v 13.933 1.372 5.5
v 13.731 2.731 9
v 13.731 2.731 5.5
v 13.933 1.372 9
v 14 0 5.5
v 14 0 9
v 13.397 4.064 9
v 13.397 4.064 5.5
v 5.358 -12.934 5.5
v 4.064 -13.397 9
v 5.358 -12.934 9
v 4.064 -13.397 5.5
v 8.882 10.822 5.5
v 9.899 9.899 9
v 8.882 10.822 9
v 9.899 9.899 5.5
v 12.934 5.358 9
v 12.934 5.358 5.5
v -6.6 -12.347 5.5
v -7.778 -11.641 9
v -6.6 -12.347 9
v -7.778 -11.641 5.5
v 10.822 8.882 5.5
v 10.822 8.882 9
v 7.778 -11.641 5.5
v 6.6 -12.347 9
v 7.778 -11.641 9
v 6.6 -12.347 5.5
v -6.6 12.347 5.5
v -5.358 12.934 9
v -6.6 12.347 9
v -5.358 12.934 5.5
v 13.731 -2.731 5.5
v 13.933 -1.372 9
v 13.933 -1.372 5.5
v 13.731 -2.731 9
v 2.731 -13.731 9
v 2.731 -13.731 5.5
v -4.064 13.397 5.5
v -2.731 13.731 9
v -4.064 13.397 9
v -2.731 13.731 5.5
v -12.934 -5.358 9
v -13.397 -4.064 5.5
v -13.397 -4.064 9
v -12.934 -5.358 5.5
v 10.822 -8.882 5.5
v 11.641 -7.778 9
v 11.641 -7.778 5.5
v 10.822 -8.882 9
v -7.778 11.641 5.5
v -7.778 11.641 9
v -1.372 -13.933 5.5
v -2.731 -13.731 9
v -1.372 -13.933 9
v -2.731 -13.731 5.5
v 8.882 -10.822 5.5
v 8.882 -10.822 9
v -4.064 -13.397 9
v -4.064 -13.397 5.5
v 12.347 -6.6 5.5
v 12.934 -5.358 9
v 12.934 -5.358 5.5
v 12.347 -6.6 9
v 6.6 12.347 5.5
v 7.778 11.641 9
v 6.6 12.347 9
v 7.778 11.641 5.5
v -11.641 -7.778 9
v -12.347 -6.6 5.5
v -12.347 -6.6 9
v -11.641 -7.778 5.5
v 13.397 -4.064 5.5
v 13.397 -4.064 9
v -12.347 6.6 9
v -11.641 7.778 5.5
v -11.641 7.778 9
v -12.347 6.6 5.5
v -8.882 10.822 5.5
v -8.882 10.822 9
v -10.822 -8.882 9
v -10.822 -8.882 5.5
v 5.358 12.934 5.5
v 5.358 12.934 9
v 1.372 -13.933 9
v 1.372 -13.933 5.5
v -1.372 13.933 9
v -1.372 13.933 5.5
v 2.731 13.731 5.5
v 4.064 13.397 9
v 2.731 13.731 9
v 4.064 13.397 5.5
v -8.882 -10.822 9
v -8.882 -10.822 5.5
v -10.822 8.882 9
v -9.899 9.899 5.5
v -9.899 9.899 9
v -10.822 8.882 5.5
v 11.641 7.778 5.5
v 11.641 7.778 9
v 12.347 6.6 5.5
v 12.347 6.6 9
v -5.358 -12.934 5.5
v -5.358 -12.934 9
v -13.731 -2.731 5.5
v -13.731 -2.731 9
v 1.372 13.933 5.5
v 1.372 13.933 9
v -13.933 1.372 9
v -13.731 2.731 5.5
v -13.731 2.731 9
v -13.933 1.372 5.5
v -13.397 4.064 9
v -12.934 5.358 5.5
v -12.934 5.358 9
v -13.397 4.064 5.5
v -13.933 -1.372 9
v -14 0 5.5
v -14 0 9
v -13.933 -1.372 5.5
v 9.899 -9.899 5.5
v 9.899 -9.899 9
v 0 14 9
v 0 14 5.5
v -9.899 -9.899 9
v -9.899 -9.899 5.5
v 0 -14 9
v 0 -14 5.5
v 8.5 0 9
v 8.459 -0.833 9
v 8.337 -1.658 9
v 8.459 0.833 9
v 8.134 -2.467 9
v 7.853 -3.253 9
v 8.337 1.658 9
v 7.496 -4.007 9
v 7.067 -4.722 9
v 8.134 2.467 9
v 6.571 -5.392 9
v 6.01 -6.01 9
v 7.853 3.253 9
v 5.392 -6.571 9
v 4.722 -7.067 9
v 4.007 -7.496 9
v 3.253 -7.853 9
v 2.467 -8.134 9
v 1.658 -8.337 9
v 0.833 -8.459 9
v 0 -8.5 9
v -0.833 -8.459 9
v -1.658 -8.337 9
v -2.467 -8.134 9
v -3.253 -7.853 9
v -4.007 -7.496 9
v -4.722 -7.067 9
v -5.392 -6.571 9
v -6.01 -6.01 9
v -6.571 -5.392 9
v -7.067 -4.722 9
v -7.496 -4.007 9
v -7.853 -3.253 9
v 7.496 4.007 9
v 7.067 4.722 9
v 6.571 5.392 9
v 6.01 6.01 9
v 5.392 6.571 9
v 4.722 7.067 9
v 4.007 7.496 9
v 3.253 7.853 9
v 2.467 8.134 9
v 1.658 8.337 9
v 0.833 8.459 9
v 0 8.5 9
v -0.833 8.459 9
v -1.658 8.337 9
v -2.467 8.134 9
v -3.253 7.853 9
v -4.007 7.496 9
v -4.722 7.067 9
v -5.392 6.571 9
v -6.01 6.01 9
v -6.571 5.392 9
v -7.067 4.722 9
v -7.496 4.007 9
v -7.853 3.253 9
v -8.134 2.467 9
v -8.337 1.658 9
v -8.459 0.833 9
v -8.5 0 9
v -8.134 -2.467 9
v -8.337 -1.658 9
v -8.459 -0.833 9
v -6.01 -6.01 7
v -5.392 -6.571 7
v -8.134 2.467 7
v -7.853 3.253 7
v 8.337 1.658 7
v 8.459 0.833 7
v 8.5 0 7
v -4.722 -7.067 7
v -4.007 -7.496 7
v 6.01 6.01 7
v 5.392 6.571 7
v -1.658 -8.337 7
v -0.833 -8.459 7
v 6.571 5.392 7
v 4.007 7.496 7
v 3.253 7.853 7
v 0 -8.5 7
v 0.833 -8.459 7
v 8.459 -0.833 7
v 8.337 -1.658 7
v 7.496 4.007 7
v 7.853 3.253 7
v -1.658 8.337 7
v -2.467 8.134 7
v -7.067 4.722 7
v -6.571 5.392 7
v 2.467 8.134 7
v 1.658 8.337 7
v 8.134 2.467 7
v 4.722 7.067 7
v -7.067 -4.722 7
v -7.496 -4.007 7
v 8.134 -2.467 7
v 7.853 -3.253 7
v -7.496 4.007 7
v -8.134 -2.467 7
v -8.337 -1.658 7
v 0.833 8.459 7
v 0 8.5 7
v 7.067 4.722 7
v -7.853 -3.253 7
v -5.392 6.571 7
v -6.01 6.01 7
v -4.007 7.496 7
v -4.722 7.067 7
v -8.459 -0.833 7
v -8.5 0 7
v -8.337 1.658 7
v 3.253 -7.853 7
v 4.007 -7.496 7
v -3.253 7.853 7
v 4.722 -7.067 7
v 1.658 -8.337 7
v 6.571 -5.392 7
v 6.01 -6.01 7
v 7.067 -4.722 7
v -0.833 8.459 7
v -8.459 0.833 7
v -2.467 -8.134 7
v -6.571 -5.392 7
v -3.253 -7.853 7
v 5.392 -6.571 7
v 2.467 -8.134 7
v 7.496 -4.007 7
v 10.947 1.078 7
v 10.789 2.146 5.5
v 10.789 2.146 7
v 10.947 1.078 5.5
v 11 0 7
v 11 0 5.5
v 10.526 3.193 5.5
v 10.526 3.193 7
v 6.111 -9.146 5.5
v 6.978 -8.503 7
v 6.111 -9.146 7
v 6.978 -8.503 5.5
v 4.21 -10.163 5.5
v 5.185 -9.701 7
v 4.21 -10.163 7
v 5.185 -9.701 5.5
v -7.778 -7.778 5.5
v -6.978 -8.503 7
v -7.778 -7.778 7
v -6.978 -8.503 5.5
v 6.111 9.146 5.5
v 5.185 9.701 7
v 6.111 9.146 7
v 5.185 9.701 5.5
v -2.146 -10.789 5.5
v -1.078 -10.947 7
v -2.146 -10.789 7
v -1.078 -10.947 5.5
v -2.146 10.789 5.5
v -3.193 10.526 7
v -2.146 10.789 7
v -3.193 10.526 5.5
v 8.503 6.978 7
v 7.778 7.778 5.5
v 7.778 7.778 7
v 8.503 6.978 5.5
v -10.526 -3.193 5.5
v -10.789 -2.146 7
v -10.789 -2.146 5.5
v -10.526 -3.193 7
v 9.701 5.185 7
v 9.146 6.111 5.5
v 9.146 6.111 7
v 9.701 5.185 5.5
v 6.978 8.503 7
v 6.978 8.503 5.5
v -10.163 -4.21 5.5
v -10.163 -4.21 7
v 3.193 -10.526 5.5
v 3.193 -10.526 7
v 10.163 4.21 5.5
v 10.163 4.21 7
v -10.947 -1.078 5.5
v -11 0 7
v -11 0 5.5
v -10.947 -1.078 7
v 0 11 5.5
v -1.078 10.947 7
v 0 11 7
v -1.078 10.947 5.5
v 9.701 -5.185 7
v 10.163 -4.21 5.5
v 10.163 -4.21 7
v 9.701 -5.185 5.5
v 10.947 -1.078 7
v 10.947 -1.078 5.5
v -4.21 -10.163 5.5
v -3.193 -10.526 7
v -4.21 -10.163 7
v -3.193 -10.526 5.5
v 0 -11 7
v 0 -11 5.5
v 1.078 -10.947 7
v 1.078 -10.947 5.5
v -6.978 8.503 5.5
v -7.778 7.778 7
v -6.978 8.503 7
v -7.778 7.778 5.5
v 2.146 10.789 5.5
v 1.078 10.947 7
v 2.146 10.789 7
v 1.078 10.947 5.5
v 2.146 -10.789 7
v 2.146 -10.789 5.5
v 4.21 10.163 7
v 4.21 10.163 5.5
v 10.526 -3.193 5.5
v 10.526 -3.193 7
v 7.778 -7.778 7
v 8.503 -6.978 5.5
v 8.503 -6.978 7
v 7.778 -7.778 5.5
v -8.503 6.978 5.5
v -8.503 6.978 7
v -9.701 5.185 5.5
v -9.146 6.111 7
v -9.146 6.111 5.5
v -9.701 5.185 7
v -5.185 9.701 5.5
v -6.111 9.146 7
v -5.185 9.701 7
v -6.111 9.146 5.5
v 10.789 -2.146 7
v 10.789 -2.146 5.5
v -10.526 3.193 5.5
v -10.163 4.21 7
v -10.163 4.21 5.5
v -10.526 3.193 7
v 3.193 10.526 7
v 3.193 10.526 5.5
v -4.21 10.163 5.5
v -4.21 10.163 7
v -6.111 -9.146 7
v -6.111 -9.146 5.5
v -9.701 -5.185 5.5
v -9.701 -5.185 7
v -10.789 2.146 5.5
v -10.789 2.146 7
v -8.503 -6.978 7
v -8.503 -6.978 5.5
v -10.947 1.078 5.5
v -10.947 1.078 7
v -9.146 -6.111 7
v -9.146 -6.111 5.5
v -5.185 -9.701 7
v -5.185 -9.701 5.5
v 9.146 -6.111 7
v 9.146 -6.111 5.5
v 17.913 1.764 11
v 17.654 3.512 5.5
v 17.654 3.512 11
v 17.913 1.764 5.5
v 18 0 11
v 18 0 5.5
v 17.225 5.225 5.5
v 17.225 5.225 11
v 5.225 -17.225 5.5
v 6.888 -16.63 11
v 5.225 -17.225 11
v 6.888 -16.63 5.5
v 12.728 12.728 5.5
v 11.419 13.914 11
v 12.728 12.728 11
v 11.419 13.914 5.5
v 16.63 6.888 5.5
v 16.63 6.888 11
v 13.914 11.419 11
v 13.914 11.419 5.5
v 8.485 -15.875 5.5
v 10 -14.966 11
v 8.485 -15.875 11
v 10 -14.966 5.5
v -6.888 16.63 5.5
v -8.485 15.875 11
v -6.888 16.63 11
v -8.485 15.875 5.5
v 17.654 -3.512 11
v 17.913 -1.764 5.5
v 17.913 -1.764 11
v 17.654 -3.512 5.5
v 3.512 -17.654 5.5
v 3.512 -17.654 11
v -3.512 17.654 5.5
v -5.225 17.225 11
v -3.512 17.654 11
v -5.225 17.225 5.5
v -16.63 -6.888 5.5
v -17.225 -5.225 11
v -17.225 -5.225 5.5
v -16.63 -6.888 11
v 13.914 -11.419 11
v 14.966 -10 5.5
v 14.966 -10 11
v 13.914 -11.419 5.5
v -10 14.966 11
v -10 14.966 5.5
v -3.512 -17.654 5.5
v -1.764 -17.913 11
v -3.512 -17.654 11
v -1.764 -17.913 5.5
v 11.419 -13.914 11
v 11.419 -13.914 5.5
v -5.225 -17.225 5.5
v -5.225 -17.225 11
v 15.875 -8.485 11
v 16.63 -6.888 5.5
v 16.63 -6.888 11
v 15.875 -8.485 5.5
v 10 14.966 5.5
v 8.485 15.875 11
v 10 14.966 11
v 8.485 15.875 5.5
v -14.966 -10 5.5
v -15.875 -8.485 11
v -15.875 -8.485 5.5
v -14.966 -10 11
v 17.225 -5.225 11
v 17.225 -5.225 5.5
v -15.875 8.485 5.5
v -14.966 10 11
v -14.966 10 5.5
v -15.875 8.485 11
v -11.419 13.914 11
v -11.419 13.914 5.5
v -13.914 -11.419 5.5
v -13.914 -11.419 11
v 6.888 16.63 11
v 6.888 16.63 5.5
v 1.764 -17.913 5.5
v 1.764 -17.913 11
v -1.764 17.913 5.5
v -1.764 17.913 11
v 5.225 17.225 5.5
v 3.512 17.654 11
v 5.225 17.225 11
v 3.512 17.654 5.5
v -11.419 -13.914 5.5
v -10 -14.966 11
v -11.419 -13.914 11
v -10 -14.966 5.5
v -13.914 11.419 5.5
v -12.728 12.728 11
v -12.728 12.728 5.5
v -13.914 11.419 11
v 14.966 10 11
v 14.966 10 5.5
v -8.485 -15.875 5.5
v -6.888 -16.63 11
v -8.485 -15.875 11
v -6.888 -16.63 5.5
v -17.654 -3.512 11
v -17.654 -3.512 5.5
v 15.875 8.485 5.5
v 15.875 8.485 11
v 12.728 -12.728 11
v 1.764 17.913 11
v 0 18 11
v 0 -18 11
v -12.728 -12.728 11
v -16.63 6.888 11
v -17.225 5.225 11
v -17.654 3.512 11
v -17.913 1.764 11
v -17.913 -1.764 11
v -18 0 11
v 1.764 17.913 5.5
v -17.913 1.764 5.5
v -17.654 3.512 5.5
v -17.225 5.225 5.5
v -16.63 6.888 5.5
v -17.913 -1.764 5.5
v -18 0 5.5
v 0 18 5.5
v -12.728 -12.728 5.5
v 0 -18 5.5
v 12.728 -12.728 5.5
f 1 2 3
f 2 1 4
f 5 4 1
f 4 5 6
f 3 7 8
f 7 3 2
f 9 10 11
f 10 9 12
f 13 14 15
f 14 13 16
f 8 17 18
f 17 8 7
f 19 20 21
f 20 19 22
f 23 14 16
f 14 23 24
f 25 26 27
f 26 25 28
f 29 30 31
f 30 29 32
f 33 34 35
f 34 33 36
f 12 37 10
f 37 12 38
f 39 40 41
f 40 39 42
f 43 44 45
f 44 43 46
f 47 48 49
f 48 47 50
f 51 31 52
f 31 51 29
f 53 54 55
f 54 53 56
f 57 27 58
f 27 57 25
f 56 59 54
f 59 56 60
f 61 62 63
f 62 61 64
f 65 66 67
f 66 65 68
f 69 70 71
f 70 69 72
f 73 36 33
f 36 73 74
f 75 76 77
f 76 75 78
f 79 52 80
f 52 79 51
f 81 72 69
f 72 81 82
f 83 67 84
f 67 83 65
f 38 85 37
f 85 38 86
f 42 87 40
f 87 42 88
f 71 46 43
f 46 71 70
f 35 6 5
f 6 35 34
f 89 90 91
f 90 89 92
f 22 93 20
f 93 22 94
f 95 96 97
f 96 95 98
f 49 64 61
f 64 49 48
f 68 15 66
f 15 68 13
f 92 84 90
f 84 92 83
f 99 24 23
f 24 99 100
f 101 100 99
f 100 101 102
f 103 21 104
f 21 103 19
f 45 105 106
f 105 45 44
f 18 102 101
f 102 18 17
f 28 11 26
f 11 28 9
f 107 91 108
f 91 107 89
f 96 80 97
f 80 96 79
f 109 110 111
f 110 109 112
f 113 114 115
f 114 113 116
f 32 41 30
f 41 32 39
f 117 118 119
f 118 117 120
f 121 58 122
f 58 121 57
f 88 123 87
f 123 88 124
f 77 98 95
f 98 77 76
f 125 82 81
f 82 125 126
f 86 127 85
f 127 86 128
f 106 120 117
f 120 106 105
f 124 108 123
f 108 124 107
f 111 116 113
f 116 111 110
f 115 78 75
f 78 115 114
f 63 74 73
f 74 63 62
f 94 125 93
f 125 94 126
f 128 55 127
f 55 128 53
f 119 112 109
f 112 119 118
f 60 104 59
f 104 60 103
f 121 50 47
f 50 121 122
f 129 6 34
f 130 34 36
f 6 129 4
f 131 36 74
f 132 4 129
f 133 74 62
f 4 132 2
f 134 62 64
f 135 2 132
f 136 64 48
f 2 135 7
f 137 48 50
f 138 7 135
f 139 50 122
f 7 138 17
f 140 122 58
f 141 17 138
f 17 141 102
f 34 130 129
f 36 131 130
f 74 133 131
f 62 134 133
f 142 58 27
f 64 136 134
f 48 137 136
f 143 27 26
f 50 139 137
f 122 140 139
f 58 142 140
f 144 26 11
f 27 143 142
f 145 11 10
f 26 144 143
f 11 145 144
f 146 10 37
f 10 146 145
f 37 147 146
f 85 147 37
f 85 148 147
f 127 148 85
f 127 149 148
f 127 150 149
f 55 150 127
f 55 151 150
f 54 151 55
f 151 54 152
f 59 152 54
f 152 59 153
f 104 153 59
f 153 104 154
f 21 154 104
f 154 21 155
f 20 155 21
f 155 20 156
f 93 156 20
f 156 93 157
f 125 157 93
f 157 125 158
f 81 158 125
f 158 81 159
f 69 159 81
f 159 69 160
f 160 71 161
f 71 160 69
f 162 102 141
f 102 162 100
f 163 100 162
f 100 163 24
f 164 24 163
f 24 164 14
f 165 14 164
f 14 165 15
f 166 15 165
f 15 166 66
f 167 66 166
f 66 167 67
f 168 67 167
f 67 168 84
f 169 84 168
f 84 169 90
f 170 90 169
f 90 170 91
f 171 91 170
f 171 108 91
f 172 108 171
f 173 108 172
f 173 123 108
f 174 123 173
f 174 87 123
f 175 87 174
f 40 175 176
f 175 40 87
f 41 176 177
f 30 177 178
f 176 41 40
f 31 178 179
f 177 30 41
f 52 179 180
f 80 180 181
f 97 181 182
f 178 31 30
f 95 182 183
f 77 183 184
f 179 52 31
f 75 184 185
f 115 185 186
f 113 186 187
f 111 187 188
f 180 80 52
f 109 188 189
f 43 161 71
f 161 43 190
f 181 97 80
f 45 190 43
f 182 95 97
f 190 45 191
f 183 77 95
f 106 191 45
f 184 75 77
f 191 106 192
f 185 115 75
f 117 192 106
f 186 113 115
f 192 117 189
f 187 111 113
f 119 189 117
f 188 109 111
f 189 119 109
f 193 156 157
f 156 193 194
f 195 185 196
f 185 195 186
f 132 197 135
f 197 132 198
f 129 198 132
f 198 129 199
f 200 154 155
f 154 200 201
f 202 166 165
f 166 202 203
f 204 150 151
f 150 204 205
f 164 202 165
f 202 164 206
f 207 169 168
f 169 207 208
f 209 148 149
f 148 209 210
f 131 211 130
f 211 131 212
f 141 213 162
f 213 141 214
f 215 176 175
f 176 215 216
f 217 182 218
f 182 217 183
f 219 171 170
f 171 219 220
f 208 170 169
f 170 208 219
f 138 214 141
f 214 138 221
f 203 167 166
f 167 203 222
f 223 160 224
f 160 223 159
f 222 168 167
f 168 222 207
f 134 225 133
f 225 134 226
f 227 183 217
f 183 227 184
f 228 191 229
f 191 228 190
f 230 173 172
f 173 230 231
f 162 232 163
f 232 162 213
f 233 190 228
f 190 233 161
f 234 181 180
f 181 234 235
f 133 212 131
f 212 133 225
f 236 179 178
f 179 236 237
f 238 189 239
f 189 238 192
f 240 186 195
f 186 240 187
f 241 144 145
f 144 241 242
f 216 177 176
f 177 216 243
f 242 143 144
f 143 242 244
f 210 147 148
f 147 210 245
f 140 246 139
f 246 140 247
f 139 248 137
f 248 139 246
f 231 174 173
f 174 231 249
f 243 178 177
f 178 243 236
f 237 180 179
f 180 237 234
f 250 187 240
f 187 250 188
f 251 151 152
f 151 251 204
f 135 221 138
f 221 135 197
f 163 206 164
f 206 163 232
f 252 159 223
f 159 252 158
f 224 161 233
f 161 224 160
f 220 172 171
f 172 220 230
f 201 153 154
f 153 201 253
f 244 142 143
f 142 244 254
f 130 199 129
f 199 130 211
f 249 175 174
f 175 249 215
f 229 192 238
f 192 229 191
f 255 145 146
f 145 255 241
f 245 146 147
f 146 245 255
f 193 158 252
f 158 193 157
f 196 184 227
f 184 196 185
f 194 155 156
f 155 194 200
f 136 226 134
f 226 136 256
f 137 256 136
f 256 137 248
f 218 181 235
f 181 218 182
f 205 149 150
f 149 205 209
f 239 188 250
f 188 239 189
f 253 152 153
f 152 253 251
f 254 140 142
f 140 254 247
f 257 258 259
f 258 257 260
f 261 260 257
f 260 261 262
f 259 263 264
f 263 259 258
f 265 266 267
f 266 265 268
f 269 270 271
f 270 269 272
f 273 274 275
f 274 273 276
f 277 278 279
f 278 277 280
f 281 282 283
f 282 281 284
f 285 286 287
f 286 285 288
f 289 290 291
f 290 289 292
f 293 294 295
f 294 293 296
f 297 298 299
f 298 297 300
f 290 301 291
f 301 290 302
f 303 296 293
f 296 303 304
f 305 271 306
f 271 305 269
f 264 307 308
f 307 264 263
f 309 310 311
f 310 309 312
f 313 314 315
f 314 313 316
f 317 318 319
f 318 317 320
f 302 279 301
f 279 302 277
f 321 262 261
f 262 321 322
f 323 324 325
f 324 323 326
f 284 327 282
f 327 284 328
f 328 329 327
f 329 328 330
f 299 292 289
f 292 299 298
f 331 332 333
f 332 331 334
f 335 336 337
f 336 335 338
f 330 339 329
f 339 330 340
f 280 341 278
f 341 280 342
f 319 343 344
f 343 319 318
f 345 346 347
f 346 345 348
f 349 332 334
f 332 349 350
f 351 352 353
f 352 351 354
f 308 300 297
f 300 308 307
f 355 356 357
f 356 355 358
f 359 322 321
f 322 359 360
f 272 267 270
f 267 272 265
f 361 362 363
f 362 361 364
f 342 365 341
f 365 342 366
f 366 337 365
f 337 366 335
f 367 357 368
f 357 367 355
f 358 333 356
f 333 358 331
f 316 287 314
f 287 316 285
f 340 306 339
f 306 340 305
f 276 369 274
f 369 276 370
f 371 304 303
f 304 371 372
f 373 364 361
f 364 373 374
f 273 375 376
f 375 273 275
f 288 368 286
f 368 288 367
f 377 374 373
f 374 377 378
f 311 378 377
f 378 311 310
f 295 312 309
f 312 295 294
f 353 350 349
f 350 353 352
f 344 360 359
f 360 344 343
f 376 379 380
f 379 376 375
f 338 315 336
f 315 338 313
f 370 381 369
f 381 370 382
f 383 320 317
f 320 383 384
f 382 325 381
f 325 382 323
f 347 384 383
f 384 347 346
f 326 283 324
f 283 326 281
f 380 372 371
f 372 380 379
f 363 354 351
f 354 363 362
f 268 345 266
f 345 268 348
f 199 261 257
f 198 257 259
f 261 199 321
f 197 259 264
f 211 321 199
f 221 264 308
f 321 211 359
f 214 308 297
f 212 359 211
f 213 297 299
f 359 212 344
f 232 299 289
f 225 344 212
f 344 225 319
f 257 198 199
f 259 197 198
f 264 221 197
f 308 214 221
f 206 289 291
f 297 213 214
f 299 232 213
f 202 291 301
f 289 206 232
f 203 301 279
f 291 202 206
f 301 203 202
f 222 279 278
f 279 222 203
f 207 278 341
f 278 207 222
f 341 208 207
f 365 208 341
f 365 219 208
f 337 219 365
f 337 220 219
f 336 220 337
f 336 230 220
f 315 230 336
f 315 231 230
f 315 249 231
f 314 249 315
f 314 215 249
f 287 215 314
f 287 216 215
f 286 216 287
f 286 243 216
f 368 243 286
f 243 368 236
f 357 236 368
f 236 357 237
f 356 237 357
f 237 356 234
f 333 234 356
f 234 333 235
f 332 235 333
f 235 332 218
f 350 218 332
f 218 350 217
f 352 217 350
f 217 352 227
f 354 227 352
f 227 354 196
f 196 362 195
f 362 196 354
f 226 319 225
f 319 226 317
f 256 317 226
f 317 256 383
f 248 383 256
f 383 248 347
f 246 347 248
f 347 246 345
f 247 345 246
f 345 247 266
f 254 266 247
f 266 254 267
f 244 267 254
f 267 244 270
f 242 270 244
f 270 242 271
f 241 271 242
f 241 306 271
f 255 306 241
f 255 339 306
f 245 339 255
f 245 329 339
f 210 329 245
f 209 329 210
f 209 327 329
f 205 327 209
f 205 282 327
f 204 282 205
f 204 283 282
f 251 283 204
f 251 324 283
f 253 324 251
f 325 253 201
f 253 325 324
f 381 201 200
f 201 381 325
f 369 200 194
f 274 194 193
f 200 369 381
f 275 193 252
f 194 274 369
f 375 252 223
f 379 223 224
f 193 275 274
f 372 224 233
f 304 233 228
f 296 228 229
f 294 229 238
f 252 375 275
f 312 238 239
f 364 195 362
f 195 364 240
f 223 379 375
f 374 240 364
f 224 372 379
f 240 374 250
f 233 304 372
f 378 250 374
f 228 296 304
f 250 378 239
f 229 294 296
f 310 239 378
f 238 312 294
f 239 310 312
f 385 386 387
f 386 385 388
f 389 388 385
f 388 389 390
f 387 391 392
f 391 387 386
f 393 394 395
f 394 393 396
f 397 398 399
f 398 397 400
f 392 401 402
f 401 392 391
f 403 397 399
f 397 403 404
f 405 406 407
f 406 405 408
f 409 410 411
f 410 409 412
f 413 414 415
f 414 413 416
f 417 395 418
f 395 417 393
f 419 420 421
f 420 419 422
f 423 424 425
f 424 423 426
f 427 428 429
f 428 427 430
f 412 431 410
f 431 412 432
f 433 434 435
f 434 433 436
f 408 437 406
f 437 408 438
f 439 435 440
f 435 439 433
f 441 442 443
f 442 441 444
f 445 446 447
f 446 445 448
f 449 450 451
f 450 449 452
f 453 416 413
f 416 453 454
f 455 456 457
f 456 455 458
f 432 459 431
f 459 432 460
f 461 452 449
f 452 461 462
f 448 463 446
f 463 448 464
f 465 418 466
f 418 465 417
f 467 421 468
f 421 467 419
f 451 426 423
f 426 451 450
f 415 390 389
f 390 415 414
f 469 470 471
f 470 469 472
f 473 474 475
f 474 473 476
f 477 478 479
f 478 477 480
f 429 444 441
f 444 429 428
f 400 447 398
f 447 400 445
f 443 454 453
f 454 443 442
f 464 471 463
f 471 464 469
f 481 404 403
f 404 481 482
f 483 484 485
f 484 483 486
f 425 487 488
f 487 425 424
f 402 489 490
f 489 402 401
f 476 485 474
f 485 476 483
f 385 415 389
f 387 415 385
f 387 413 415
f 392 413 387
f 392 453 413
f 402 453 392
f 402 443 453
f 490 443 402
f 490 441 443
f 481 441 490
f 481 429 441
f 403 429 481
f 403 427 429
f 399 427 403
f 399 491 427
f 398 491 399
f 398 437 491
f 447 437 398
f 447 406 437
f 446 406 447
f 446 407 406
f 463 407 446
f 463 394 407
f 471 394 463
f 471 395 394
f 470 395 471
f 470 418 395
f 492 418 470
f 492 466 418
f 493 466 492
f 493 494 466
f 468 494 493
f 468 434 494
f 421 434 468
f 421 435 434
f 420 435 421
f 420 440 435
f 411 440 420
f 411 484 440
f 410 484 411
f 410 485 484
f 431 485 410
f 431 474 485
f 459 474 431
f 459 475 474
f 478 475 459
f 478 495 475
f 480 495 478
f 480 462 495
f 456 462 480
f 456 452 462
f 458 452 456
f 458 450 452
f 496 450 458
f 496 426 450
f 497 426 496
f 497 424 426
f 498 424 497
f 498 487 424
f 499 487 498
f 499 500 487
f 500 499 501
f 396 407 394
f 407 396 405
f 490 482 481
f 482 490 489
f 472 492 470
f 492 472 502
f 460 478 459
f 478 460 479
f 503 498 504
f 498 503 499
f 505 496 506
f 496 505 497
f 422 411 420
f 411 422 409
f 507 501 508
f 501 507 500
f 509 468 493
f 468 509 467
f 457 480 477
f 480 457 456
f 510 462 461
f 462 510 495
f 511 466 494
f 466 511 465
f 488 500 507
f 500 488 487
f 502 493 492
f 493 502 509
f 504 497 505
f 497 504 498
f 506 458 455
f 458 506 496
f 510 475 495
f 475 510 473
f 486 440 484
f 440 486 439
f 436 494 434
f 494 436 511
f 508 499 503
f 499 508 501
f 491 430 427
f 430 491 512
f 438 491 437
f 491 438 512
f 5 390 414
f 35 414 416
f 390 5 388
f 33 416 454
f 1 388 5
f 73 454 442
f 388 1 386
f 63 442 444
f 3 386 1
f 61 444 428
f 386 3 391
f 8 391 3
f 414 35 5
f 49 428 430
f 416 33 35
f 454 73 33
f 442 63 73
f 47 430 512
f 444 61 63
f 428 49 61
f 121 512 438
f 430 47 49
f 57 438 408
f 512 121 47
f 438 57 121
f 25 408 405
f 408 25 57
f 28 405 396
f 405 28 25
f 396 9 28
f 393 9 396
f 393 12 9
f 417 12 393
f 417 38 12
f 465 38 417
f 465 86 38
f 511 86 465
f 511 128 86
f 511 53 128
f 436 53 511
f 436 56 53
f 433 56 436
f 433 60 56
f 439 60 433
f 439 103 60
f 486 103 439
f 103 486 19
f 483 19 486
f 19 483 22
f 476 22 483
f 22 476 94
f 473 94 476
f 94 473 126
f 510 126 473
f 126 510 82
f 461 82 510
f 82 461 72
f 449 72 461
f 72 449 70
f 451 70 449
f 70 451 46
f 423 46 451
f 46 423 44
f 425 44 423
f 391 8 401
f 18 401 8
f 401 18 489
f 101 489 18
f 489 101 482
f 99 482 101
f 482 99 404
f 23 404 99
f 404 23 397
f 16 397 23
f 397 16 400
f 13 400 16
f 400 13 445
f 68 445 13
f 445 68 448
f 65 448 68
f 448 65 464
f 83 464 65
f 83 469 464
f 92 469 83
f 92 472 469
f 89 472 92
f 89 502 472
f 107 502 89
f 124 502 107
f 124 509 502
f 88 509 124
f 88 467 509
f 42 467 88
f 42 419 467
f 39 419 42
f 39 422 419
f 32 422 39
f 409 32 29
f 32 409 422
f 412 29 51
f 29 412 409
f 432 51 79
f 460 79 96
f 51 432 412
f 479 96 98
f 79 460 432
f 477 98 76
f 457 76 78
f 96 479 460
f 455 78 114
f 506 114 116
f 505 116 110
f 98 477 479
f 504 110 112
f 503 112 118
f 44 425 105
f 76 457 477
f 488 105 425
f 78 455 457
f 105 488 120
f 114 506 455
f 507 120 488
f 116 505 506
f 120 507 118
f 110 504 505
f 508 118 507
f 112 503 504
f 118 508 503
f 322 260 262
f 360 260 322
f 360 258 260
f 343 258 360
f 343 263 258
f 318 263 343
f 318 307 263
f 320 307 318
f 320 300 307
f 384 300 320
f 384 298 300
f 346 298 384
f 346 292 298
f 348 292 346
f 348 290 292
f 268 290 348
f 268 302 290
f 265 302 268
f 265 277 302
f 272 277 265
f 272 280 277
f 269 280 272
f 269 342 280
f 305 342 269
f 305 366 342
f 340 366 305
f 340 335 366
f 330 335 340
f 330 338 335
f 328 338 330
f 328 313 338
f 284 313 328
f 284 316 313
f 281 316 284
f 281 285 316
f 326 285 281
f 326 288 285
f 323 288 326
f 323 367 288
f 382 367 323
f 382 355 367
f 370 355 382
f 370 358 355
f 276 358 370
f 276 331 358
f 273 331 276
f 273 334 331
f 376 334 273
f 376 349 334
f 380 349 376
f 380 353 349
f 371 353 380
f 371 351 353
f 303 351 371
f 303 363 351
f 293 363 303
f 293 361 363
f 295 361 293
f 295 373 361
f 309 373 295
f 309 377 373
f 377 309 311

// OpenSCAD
// Global constants
$fn=64;
$cuttingCubeSize = 1000;
$cuttingCylinderSize = 50;

$bearingD = 22;
$bearingH = 7;
$wallRollingSurface = 3;
$wallSide = 2;
$wallSleeve = 5;

$formWall = 2;

detail();

module detail() {
    
    $formHeight = $bearingH + $wallSide * 2;
    
    intersection() {
        difference() {
            color([1,1,0]) translate ([0,0,-$wallSide-$formWall])
                cylinder(r = ($bearingD / 2) + $wallRollingSurface + $formWall * 2, 
                    h = $bearingH + $wallSide * 2 + $formWall * 2);
            difference() {
                union() {
                    color([0,1,0]) cylinder(r = ($bearingD / 2) + $wallRollingSurface, h = $bearingH); // rolling surface
                    color([0,0,1]) translate ([0,0,-$wallSide])
                        cylinder(r = ($bearingD / 2) + $wallRollingSurface, h = $bearingH + $wallSide * 2); // sleeves sides
                }
                color([0,1,1]) translate ([0,0,-$cuttingCylinderSize/2])
                    cylinder(r = ($bearingD - $wallSleeve) / 2, h = $cuttingCylinderSize); // sleeves sides cutout
                color([1,0,0]) cylinder(r = $bearingD / 2, h = $bearingH); // bearing
            }
        }
        translate([-$cuttingCubeSize/2, -$cuttingCubeSize/2, $formHeight / 2])
            cube ([$cuttingCubeSize, $cuttingCubeSize, $cuttingCubeSize]);
    }
    /*
    
        difference() {
            cylinder(r = ($bearingD / 2) + $wallRollingSurface, h = $formHeight);
            translate([0, 0, $wallSide])
                cylinder(r = $bearingD / 2, h = $bearingH);
        }
        translate([-$cuttingCubeSize/2, -$cuttingCubeSize/2, $formHeight / 2])
            cube ([$cuttingCubeSize, $cuttingCubeSize, $cuttingCubeSize]);
    }
    */
    
    
    
    
    
}
